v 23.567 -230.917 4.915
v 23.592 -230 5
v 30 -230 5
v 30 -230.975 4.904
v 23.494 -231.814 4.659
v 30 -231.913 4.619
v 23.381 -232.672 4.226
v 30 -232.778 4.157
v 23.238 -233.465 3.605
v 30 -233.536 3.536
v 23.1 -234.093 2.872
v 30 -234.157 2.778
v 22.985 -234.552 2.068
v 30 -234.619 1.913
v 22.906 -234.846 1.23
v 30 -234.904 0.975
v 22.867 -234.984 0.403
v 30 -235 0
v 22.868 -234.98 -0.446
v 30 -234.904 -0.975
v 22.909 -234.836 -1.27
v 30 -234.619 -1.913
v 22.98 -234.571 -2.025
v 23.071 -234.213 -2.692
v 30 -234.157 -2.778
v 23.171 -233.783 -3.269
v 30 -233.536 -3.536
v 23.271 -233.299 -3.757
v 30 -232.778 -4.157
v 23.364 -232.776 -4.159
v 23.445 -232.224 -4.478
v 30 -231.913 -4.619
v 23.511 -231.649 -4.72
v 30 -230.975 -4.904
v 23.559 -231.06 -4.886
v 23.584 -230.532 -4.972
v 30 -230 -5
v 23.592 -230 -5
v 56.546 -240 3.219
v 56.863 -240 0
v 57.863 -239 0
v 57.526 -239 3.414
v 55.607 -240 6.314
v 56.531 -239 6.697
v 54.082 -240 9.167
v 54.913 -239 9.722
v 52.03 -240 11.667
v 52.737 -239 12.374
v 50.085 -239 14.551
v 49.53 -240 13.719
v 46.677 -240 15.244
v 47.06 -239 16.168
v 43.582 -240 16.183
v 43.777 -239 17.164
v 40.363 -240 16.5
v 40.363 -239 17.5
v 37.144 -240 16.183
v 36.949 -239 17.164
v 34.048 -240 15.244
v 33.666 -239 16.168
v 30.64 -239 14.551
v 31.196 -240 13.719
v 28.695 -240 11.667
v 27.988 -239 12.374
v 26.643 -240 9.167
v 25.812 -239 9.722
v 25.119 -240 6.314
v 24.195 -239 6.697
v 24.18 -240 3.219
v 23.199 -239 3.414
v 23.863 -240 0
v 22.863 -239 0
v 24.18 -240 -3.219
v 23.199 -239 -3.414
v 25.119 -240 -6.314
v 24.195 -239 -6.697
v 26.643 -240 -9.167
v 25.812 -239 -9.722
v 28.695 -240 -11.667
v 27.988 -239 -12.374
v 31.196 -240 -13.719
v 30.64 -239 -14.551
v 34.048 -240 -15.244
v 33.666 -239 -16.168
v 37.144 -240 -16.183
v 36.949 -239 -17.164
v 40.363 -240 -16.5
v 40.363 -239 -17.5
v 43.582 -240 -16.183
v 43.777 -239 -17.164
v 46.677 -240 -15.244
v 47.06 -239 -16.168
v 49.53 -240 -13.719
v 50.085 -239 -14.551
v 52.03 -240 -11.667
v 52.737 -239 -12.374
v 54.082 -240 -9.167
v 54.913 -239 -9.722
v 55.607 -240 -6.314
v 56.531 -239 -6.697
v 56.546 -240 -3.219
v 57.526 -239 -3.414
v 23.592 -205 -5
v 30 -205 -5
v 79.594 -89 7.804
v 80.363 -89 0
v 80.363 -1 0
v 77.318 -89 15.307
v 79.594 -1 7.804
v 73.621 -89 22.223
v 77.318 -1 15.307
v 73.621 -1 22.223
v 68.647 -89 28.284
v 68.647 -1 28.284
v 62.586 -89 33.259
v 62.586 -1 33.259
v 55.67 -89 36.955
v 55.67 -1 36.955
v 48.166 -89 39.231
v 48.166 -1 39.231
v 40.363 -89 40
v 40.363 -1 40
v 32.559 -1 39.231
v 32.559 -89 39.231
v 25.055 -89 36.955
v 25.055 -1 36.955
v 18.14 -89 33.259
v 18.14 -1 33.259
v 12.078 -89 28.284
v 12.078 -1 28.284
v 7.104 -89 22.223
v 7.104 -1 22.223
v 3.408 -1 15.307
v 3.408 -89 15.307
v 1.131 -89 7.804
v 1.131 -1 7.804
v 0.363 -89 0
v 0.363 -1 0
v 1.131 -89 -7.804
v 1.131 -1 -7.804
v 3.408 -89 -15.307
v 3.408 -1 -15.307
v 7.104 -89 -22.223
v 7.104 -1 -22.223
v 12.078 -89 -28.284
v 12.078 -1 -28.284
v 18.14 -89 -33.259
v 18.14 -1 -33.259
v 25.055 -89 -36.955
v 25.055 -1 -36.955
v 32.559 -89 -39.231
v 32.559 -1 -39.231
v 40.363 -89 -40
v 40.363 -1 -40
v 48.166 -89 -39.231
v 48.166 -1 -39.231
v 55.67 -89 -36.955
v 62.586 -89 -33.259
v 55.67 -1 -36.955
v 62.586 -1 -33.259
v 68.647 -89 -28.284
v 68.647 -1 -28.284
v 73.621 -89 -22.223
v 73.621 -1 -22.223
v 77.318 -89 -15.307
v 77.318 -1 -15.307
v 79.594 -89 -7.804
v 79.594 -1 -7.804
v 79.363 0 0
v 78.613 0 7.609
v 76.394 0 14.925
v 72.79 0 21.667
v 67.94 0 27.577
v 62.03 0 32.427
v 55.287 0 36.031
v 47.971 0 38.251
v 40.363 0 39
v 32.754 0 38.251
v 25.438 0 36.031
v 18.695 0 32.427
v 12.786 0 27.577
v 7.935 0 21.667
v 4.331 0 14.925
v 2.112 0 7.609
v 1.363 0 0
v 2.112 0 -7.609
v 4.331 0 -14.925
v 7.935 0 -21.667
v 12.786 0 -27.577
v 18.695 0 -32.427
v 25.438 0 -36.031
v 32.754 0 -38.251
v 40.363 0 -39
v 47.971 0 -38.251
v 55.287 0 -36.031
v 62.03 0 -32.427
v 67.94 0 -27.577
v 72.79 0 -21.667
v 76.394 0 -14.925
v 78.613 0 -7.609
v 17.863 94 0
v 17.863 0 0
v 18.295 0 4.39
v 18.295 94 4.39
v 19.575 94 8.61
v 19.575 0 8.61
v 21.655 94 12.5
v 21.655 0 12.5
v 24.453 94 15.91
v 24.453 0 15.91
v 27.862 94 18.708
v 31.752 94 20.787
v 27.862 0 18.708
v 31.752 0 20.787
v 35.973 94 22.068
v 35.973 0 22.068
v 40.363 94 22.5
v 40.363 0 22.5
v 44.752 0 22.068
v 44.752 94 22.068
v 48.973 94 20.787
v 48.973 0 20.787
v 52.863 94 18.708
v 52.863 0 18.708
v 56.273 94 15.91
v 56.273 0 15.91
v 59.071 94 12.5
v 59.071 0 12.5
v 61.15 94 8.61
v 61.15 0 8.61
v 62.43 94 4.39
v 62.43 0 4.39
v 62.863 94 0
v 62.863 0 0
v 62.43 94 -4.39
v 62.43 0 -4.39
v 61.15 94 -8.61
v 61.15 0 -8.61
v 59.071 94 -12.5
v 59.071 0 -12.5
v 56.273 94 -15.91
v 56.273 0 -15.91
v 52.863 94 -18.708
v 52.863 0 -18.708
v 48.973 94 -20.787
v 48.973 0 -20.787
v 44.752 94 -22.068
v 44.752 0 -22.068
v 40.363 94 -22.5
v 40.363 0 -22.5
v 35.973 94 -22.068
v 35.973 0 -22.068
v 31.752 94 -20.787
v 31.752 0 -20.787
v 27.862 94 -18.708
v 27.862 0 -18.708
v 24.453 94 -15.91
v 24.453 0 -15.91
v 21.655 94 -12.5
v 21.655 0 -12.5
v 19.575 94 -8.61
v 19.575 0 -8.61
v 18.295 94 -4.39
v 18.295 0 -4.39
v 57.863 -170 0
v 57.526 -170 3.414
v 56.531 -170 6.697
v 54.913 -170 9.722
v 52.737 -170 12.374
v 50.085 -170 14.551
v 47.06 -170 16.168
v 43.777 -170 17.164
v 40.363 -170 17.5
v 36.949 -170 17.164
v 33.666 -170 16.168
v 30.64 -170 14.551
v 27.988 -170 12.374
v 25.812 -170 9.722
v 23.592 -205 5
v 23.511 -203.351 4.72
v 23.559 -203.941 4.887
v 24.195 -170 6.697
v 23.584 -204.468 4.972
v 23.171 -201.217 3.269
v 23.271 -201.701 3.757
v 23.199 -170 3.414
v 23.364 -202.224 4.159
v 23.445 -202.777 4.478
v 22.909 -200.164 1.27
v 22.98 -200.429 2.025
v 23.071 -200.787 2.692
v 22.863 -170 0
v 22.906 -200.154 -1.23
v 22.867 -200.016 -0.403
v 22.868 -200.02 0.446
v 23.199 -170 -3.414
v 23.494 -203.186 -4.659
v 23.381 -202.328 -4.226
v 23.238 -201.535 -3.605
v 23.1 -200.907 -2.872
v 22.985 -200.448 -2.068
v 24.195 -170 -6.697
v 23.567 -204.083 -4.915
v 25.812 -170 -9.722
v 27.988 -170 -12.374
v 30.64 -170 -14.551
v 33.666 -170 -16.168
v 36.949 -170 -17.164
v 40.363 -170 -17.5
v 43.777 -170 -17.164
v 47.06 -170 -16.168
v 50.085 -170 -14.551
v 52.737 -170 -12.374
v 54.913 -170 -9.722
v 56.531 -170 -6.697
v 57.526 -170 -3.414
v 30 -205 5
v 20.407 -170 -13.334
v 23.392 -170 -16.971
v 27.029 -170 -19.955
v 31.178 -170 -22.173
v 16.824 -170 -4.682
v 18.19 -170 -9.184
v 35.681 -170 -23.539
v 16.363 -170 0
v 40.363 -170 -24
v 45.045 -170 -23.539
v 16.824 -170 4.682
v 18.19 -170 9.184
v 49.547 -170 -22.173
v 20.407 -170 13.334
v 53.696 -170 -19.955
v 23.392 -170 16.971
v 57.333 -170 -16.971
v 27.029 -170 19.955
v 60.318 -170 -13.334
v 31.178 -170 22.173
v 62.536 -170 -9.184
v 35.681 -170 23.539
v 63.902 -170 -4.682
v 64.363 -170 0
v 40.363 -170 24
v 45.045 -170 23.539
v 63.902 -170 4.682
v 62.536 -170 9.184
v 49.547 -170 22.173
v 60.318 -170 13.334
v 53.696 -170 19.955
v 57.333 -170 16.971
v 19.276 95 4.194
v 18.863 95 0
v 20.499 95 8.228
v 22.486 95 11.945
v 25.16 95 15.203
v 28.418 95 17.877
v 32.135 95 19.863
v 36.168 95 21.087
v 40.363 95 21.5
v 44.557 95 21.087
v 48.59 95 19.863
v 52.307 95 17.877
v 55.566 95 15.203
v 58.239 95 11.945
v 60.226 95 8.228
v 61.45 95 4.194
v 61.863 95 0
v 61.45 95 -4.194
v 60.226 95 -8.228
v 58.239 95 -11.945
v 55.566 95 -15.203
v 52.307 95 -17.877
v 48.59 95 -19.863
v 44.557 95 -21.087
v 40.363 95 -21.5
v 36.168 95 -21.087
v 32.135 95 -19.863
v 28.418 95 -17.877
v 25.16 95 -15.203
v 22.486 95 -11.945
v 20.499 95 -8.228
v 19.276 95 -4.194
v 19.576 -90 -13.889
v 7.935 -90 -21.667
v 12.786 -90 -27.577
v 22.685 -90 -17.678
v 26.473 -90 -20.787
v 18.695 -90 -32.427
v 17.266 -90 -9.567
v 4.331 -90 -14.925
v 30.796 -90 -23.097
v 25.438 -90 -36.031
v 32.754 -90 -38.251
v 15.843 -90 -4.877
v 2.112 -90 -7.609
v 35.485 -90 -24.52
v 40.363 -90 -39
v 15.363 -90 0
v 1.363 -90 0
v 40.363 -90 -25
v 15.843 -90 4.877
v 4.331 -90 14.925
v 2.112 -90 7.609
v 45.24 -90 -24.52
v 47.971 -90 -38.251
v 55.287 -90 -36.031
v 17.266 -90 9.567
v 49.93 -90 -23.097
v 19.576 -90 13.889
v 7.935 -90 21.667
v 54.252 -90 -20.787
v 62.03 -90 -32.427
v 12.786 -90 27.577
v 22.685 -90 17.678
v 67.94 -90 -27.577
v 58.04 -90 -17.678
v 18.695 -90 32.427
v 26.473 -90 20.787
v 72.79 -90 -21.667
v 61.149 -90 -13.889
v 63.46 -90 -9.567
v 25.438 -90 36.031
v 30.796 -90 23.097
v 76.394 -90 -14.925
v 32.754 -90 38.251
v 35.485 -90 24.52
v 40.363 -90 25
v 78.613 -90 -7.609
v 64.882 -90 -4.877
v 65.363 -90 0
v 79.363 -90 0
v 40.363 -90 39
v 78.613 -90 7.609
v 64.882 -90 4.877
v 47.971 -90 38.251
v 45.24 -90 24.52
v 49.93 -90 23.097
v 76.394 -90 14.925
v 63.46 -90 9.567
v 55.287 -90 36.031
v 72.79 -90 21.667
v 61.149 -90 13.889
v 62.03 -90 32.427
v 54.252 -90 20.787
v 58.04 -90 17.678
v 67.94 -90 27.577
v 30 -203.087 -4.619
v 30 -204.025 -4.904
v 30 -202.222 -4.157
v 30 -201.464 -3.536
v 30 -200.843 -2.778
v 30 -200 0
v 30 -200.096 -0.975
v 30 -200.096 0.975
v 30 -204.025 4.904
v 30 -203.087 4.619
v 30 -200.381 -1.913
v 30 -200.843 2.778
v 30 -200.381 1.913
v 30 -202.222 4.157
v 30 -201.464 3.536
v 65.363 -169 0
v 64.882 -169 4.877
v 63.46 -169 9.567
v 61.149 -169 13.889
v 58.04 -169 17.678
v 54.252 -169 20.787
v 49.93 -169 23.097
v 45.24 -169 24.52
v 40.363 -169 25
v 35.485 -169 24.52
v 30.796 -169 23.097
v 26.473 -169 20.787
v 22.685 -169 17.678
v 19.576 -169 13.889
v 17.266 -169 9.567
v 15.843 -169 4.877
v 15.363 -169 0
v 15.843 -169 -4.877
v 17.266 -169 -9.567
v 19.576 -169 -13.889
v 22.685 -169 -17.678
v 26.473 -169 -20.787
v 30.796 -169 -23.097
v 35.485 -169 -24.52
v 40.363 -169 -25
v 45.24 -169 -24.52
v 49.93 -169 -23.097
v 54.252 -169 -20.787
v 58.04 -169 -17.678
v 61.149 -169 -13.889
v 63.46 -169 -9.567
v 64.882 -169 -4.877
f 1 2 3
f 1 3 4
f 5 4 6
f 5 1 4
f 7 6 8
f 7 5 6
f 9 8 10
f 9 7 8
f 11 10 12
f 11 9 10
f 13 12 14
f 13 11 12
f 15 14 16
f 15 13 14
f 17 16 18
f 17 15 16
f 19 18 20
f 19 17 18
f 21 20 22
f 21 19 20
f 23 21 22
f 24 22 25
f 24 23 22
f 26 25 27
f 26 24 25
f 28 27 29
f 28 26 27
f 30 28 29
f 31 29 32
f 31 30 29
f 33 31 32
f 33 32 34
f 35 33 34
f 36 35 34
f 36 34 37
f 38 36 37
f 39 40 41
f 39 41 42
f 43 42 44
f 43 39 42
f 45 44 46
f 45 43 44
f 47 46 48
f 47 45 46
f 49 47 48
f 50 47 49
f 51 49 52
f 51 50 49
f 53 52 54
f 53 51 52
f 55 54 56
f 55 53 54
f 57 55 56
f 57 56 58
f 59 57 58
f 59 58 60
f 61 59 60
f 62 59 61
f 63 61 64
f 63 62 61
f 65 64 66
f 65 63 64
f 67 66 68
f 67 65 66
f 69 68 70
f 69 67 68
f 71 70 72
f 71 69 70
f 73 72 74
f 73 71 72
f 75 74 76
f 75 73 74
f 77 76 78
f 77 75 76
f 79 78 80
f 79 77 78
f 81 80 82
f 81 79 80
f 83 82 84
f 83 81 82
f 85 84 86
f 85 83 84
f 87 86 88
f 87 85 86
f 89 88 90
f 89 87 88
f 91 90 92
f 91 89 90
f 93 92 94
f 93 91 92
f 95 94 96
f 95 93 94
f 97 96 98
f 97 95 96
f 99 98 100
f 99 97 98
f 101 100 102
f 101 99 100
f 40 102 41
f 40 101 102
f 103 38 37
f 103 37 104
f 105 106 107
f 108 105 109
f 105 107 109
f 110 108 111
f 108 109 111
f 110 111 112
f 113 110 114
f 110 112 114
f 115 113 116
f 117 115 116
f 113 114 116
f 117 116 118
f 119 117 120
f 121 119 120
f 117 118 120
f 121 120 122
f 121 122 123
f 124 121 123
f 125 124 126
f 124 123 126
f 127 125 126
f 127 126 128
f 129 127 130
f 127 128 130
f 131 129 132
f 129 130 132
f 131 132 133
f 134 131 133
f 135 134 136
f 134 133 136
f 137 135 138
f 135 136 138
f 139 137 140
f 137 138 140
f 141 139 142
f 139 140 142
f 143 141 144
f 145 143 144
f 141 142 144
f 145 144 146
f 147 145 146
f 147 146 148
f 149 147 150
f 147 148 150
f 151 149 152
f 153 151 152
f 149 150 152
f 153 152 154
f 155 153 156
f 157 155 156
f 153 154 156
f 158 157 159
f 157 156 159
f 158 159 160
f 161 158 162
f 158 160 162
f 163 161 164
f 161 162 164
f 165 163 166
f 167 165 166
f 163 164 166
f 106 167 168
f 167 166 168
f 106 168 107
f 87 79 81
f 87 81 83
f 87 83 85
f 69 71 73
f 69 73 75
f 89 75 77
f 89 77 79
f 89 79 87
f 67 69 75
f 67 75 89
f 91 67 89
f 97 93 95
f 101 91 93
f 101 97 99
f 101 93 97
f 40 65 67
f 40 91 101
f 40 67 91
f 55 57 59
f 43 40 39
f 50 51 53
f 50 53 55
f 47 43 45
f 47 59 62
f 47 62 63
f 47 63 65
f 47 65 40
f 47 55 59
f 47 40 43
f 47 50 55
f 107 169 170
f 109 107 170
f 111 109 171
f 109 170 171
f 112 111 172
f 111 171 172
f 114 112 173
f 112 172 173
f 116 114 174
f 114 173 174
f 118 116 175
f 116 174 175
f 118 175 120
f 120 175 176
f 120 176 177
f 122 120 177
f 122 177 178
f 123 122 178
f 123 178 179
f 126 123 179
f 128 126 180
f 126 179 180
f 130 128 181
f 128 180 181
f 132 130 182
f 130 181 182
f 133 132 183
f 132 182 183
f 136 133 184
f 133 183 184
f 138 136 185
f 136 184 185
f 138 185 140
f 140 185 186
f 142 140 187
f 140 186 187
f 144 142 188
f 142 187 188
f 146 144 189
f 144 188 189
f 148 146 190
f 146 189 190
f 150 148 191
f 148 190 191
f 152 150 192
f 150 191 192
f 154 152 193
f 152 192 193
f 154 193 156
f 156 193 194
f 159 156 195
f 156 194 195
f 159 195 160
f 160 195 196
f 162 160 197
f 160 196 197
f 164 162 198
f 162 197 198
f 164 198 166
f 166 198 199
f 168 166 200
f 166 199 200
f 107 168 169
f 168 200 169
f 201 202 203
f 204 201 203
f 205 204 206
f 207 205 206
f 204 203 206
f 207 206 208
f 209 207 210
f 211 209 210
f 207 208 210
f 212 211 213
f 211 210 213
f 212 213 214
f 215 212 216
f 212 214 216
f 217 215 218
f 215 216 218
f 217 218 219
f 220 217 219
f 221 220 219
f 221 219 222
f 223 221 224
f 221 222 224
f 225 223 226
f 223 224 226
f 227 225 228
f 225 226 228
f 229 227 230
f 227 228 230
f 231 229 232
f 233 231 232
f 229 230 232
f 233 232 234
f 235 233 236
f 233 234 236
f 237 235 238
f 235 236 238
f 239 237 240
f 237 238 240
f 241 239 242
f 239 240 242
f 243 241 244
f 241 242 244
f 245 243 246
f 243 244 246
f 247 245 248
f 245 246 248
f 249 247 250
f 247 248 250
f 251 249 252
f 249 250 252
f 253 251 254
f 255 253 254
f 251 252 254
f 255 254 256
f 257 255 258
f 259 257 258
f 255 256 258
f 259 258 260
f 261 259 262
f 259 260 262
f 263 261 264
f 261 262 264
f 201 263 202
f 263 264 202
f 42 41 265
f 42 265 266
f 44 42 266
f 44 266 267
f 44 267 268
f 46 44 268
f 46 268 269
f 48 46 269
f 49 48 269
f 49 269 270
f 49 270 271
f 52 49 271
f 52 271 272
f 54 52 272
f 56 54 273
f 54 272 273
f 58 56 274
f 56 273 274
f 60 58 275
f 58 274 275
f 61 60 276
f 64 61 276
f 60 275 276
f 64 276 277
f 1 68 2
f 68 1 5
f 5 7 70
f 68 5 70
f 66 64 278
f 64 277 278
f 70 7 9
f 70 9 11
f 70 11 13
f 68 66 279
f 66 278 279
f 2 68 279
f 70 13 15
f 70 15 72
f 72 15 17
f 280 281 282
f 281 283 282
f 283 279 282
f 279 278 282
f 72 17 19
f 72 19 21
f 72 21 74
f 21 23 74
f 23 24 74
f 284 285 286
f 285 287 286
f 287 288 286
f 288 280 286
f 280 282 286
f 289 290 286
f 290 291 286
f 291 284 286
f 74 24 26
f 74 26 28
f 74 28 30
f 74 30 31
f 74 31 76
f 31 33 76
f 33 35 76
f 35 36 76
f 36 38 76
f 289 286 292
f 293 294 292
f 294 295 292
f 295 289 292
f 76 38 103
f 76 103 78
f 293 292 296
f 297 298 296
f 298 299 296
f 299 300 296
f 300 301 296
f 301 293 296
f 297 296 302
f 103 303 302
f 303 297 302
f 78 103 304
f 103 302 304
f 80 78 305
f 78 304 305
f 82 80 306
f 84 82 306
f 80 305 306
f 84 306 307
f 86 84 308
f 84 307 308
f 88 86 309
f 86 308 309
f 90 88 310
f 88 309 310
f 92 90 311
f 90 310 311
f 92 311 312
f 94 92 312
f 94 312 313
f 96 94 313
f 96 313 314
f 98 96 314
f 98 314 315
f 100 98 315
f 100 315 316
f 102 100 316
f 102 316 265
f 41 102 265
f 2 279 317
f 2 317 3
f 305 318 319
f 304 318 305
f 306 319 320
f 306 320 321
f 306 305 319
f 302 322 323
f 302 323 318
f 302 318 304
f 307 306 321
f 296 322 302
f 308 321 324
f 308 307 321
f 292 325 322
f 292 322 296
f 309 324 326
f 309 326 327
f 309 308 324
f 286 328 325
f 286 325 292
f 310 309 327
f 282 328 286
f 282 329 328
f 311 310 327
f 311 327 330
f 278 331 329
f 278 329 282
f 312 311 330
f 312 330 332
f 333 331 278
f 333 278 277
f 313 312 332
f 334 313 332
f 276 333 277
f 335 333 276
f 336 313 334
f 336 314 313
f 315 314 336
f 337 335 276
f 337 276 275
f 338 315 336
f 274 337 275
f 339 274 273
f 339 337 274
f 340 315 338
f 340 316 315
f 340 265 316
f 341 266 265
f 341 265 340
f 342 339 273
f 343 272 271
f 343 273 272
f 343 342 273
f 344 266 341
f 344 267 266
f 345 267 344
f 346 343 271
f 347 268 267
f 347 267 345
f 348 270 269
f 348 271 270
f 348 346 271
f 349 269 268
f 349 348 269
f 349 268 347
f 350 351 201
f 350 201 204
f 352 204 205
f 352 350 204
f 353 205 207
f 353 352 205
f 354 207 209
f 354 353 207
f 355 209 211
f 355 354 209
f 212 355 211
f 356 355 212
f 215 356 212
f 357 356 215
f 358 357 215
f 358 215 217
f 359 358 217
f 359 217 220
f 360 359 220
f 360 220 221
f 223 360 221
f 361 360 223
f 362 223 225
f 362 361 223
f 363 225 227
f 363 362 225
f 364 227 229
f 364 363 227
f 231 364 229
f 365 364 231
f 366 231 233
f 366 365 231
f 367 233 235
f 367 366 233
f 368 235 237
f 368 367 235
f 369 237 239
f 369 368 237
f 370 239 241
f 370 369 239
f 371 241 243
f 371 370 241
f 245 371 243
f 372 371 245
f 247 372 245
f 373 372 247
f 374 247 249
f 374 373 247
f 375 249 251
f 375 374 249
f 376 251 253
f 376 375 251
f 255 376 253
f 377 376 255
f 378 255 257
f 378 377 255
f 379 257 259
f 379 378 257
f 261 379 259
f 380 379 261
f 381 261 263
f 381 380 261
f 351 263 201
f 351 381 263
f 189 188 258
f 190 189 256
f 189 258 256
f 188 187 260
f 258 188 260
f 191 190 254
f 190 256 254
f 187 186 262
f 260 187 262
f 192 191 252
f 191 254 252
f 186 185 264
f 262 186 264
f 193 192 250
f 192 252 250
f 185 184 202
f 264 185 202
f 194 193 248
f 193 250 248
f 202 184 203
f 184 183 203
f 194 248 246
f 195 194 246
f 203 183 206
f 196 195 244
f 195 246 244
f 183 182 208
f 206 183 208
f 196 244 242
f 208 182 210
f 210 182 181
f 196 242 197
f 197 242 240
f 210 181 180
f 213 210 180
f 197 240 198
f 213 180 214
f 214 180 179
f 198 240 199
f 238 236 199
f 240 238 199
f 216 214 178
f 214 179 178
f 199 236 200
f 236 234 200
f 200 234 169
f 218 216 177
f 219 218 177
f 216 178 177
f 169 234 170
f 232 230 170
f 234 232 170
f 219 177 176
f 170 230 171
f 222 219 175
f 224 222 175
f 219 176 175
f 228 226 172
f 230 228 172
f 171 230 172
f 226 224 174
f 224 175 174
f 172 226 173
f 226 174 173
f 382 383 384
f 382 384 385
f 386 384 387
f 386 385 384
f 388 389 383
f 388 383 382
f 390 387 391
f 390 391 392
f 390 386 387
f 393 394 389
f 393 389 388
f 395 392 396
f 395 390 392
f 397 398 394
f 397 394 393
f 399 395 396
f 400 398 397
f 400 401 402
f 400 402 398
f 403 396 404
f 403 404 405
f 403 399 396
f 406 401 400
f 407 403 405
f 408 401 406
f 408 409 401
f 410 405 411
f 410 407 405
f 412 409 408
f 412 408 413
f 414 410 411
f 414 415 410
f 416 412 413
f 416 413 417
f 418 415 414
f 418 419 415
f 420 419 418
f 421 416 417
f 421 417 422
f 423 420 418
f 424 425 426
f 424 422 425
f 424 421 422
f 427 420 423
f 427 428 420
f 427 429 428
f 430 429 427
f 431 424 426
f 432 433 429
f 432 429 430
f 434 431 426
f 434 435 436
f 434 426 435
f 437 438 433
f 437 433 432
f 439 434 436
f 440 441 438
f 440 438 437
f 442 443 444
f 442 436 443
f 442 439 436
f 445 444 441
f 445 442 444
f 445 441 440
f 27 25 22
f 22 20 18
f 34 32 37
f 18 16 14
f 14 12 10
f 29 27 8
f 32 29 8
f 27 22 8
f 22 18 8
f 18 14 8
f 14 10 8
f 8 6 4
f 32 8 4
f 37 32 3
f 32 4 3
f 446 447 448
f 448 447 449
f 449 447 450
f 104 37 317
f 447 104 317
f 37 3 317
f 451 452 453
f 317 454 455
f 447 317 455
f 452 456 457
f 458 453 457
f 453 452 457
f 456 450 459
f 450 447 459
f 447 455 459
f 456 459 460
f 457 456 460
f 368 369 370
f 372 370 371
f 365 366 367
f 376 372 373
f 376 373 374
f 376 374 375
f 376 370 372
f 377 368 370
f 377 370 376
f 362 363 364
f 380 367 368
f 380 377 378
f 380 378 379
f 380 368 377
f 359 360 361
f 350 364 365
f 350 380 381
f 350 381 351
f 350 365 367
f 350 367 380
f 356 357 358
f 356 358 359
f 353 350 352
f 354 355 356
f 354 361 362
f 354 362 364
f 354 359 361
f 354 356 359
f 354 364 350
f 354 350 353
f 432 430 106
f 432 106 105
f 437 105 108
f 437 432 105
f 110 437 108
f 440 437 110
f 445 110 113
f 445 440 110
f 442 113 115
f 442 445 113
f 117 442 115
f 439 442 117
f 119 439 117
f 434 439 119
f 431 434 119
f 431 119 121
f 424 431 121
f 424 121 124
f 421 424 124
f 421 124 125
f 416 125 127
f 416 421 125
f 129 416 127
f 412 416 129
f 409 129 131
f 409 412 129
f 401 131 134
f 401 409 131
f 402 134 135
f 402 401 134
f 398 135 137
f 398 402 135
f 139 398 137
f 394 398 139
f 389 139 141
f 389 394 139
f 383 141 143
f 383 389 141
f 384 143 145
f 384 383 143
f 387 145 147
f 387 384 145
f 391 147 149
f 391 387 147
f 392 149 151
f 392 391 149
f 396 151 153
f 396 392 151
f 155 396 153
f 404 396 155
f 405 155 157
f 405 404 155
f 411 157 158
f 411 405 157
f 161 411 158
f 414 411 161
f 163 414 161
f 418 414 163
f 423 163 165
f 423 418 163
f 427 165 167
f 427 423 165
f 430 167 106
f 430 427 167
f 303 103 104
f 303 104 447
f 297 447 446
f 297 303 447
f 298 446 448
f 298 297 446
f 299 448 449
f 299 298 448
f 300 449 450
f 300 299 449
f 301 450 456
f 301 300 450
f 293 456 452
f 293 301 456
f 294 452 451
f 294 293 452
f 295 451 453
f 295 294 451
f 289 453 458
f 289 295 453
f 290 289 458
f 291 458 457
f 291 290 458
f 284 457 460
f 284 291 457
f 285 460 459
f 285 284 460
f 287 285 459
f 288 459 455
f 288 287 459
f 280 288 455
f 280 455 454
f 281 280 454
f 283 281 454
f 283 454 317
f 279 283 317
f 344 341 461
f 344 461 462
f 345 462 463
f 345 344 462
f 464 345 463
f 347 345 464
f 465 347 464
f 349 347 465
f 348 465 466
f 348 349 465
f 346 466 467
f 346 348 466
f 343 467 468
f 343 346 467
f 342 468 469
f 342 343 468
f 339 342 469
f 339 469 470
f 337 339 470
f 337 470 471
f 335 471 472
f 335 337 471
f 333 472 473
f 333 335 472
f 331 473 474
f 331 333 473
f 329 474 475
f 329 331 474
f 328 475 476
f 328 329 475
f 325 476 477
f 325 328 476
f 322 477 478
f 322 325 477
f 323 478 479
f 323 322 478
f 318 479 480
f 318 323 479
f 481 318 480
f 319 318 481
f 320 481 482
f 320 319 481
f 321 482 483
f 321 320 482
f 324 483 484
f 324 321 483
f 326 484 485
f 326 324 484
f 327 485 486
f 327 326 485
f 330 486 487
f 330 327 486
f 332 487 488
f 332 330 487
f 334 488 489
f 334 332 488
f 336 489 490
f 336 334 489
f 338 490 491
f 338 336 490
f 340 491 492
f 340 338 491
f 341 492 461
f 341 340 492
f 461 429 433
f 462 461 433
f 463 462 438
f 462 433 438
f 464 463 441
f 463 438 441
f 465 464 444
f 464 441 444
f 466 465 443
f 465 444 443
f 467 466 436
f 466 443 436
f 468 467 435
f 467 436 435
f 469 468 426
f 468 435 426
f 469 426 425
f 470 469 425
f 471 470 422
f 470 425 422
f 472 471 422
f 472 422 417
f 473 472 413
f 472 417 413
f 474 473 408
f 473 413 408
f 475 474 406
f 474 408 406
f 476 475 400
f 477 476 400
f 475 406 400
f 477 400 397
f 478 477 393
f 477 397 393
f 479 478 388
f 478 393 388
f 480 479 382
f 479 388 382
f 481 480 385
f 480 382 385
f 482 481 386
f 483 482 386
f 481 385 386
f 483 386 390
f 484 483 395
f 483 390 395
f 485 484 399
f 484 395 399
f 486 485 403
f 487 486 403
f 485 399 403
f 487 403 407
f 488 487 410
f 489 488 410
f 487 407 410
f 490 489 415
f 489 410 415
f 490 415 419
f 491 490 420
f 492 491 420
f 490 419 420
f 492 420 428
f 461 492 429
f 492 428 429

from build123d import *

# Parameters (mm, degrees)
F0_R      = 40
F1_DEPTH  = 90
F2_R      = 25
F3_DEPTH  = 80
F4_R      = 17.5
F5_DEPTH  = 70
F7_DEPTH  = 30
F8_SIZE   = 1
F9_R      = 22.5
F10_DEPTH = 95
F11_SIZE  = 1


with BuildPart() as f1:
    # F0 (on Front) → F1 (new body)
    with BuildSketch(Plane.XZ):
        with Locations((40.362715, 0)):
            Circle(F0_R)
    extrude(amount=F1_DEPTH)

    # F2 (on face) → F3 (join)
    with BuildSketch(Plane.XZ.offset(90)):
        with Locations((40.362715, 0)):
            Circle(F2_R)
    extrude(amount=F3_DEPTH)

    # F4 (on face) → F5 (join)
    with BuildSketch(Plane.XZ.offset(170)):
        with Locations((40.362715, 0)):
            Circle(F4_R)
    extrude(amount=F5_DEPTH)

    # F6 (on Right) → F7 (cut)
    with BuildSketch(Plane.YZ):
        with BuildLine():
            ThreePointArc((-230, 5), (-235, 0), (-230, -5))
            Line((-230, -5), (-205, -5))
            ThreePointArc((-205, -5), (-200, 0), (-205, 5))
            Line((-205, 5), (-230, 5))
        make_face()
    extrude(amount=F7_DEPTH, mode=Mode.SUBTRACT)

    # F8
    f8_edges = [f1.edges().sort_by_distance(p)[0] for p in [
        (22.862715, -240, 0),
        (15.362715, -170, 0),
        (0.362715, -90, 0),
    ]]
    chamfer(f8_edges, length=F8_SIZE)

    # F9 (on face) → F10 (join)
    with BuildSketch(Plane(origin=(0, 0, 0), x_dir=(-1, 0, 0), z_dir=(0, 1, 0))):
        with Locations((-40.362715, 0)):
            Circle(F9_R)
    extrude(amount=F10_DEPTH)

    # F11
    f11_edges = [f1.edges().sort_by_distance(p)[0] for p in [
        (62.862715, 95, 0),
        (0.362715, 0, 0),
    ]]
    chamfer(f11_edges, length=F11_SIZE)


solid = f1.part
